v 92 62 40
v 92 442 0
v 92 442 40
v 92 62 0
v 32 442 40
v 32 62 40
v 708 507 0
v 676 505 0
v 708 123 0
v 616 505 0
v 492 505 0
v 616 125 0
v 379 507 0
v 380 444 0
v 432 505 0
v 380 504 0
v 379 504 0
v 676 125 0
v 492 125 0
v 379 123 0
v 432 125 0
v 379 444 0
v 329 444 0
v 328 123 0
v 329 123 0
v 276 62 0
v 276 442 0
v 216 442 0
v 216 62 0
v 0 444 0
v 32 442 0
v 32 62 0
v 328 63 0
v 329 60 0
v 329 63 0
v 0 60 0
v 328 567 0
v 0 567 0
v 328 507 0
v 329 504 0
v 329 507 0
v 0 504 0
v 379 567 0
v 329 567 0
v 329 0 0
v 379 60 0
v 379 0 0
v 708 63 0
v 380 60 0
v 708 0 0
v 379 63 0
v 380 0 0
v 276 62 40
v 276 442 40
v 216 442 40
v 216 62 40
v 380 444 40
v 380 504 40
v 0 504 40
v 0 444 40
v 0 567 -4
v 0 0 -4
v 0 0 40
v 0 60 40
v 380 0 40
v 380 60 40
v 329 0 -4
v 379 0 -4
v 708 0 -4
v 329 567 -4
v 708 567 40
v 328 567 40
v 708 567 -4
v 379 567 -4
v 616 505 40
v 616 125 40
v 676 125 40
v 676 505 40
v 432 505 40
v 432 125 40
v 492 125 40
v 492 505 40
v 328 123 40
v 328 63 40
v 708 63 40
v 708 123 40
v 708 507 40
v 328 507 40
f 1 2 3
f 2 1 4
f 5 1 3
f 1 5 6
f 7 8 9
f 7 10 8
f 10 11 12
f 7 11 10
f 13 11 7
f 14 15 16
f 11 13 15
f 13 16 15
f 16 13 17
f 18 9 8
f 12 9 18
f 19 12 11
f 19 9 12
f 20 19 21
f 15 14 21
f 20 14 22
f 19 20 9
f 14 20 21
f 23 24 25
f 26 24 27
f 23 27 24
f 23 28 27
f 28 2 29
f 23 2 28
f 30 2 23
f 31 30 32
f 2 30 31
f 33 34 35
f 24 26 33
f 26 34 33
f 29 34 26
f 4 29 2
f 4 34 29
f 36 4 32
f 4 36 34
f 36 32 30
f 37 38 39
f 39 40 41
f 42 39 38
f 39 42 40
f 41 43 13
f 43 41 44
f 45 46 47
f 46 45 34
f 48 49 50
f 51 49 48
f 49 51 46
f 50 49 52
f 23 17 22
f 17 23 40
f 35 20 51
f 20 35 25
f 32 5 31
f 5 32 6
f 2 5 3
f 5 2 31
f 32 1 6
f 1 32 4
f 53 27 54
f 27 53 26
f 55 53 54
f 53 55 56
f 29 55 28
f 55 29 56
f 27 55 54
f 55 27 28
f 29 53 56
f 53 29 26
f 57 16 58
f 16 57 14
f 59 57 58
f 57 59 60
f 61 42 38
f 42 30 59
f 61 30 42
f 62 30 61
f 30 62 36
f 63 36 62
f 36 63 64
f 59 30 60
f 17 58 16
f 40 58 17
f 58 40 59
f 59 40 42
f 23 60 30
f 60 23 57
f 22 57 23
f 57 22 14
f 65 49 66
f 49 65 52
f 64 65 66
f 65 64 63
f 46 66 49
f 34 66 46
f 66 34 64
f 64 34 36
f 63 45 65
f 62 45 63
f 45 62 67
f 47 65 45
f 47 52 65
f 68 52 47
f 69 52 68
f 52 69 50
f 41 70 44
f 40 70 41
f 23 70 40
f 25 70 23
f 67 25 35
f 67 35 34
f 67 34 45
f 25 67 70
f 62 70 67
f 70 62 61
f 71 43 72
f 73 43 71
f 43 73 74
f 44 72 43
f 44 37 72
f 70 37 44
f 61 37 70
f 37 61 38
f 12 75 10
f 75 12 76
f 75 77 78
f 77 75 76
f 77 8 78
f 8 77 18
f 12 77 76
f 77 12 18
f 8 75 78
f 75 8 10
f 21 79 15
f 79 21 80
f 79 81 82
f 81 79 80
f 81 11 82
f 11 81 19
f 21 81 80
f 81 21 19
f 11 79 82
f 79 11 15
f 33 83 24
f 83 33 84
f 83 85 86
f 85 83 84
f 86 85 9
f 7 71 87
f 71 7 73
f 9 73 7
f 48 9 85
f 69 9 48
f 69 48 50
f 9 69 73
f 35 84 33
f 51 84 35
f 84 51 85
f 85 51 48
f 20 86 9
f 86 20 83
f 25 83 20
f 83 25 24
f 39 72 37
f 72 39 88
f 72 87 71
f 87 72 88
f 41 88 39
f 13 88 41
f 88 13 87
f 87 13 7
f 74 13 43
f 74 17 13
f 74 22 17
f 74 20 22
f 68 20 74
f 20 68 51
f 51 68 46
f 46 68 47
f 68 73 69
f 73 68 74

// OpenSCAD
// Schweißtisch geschlossen

vkr_h=40;
vkr_l=380;
vkr_b=60;

p_h=4;
p_l=567;
p_b=329;

clear=2;
dist=50;

module mod() {
    // 1. bar
    translate([vkr_b/2+clear,vkr_b+clear,0]) {
        color( "Yellow", 1.0 ) {
            cube([vkr_b,vkr_l,vkr_h], 0);
        };
    };
    
    // 2. bar
    translate([p_b-vkr_b-(vkr_l-p_b)-clear,vkr_b+clear,0]) {
        color( "Lime", 1.0 ) {
            cube([vkr_b,vkr_l,vkr_h], 0);
        };
    };

    // 3. bar
    translate([0,vkr_b+vkr_l+2*clear,0]) {
        color( "ForestGreen", 1.0 ) {
            cube([vkr_l,vkr_b,vkr_h], 0);
        };
    };
    
    // 4. bar
    translate([0,0,0]) {
        color( "Olive", 1.0 ) {
            cube([vkr_l,vkr_b,vkr_h], 0);
        };
    };

    // Plate
    translate([0,0,-p_h]) {
        cube([p_b,p_l,p_h], 0);
    };
};

mod();

translate([p_b*2+dist,p_l,0]) {
    rotate(a=180, v=[0,0,1]){
        mod();
    };
};
